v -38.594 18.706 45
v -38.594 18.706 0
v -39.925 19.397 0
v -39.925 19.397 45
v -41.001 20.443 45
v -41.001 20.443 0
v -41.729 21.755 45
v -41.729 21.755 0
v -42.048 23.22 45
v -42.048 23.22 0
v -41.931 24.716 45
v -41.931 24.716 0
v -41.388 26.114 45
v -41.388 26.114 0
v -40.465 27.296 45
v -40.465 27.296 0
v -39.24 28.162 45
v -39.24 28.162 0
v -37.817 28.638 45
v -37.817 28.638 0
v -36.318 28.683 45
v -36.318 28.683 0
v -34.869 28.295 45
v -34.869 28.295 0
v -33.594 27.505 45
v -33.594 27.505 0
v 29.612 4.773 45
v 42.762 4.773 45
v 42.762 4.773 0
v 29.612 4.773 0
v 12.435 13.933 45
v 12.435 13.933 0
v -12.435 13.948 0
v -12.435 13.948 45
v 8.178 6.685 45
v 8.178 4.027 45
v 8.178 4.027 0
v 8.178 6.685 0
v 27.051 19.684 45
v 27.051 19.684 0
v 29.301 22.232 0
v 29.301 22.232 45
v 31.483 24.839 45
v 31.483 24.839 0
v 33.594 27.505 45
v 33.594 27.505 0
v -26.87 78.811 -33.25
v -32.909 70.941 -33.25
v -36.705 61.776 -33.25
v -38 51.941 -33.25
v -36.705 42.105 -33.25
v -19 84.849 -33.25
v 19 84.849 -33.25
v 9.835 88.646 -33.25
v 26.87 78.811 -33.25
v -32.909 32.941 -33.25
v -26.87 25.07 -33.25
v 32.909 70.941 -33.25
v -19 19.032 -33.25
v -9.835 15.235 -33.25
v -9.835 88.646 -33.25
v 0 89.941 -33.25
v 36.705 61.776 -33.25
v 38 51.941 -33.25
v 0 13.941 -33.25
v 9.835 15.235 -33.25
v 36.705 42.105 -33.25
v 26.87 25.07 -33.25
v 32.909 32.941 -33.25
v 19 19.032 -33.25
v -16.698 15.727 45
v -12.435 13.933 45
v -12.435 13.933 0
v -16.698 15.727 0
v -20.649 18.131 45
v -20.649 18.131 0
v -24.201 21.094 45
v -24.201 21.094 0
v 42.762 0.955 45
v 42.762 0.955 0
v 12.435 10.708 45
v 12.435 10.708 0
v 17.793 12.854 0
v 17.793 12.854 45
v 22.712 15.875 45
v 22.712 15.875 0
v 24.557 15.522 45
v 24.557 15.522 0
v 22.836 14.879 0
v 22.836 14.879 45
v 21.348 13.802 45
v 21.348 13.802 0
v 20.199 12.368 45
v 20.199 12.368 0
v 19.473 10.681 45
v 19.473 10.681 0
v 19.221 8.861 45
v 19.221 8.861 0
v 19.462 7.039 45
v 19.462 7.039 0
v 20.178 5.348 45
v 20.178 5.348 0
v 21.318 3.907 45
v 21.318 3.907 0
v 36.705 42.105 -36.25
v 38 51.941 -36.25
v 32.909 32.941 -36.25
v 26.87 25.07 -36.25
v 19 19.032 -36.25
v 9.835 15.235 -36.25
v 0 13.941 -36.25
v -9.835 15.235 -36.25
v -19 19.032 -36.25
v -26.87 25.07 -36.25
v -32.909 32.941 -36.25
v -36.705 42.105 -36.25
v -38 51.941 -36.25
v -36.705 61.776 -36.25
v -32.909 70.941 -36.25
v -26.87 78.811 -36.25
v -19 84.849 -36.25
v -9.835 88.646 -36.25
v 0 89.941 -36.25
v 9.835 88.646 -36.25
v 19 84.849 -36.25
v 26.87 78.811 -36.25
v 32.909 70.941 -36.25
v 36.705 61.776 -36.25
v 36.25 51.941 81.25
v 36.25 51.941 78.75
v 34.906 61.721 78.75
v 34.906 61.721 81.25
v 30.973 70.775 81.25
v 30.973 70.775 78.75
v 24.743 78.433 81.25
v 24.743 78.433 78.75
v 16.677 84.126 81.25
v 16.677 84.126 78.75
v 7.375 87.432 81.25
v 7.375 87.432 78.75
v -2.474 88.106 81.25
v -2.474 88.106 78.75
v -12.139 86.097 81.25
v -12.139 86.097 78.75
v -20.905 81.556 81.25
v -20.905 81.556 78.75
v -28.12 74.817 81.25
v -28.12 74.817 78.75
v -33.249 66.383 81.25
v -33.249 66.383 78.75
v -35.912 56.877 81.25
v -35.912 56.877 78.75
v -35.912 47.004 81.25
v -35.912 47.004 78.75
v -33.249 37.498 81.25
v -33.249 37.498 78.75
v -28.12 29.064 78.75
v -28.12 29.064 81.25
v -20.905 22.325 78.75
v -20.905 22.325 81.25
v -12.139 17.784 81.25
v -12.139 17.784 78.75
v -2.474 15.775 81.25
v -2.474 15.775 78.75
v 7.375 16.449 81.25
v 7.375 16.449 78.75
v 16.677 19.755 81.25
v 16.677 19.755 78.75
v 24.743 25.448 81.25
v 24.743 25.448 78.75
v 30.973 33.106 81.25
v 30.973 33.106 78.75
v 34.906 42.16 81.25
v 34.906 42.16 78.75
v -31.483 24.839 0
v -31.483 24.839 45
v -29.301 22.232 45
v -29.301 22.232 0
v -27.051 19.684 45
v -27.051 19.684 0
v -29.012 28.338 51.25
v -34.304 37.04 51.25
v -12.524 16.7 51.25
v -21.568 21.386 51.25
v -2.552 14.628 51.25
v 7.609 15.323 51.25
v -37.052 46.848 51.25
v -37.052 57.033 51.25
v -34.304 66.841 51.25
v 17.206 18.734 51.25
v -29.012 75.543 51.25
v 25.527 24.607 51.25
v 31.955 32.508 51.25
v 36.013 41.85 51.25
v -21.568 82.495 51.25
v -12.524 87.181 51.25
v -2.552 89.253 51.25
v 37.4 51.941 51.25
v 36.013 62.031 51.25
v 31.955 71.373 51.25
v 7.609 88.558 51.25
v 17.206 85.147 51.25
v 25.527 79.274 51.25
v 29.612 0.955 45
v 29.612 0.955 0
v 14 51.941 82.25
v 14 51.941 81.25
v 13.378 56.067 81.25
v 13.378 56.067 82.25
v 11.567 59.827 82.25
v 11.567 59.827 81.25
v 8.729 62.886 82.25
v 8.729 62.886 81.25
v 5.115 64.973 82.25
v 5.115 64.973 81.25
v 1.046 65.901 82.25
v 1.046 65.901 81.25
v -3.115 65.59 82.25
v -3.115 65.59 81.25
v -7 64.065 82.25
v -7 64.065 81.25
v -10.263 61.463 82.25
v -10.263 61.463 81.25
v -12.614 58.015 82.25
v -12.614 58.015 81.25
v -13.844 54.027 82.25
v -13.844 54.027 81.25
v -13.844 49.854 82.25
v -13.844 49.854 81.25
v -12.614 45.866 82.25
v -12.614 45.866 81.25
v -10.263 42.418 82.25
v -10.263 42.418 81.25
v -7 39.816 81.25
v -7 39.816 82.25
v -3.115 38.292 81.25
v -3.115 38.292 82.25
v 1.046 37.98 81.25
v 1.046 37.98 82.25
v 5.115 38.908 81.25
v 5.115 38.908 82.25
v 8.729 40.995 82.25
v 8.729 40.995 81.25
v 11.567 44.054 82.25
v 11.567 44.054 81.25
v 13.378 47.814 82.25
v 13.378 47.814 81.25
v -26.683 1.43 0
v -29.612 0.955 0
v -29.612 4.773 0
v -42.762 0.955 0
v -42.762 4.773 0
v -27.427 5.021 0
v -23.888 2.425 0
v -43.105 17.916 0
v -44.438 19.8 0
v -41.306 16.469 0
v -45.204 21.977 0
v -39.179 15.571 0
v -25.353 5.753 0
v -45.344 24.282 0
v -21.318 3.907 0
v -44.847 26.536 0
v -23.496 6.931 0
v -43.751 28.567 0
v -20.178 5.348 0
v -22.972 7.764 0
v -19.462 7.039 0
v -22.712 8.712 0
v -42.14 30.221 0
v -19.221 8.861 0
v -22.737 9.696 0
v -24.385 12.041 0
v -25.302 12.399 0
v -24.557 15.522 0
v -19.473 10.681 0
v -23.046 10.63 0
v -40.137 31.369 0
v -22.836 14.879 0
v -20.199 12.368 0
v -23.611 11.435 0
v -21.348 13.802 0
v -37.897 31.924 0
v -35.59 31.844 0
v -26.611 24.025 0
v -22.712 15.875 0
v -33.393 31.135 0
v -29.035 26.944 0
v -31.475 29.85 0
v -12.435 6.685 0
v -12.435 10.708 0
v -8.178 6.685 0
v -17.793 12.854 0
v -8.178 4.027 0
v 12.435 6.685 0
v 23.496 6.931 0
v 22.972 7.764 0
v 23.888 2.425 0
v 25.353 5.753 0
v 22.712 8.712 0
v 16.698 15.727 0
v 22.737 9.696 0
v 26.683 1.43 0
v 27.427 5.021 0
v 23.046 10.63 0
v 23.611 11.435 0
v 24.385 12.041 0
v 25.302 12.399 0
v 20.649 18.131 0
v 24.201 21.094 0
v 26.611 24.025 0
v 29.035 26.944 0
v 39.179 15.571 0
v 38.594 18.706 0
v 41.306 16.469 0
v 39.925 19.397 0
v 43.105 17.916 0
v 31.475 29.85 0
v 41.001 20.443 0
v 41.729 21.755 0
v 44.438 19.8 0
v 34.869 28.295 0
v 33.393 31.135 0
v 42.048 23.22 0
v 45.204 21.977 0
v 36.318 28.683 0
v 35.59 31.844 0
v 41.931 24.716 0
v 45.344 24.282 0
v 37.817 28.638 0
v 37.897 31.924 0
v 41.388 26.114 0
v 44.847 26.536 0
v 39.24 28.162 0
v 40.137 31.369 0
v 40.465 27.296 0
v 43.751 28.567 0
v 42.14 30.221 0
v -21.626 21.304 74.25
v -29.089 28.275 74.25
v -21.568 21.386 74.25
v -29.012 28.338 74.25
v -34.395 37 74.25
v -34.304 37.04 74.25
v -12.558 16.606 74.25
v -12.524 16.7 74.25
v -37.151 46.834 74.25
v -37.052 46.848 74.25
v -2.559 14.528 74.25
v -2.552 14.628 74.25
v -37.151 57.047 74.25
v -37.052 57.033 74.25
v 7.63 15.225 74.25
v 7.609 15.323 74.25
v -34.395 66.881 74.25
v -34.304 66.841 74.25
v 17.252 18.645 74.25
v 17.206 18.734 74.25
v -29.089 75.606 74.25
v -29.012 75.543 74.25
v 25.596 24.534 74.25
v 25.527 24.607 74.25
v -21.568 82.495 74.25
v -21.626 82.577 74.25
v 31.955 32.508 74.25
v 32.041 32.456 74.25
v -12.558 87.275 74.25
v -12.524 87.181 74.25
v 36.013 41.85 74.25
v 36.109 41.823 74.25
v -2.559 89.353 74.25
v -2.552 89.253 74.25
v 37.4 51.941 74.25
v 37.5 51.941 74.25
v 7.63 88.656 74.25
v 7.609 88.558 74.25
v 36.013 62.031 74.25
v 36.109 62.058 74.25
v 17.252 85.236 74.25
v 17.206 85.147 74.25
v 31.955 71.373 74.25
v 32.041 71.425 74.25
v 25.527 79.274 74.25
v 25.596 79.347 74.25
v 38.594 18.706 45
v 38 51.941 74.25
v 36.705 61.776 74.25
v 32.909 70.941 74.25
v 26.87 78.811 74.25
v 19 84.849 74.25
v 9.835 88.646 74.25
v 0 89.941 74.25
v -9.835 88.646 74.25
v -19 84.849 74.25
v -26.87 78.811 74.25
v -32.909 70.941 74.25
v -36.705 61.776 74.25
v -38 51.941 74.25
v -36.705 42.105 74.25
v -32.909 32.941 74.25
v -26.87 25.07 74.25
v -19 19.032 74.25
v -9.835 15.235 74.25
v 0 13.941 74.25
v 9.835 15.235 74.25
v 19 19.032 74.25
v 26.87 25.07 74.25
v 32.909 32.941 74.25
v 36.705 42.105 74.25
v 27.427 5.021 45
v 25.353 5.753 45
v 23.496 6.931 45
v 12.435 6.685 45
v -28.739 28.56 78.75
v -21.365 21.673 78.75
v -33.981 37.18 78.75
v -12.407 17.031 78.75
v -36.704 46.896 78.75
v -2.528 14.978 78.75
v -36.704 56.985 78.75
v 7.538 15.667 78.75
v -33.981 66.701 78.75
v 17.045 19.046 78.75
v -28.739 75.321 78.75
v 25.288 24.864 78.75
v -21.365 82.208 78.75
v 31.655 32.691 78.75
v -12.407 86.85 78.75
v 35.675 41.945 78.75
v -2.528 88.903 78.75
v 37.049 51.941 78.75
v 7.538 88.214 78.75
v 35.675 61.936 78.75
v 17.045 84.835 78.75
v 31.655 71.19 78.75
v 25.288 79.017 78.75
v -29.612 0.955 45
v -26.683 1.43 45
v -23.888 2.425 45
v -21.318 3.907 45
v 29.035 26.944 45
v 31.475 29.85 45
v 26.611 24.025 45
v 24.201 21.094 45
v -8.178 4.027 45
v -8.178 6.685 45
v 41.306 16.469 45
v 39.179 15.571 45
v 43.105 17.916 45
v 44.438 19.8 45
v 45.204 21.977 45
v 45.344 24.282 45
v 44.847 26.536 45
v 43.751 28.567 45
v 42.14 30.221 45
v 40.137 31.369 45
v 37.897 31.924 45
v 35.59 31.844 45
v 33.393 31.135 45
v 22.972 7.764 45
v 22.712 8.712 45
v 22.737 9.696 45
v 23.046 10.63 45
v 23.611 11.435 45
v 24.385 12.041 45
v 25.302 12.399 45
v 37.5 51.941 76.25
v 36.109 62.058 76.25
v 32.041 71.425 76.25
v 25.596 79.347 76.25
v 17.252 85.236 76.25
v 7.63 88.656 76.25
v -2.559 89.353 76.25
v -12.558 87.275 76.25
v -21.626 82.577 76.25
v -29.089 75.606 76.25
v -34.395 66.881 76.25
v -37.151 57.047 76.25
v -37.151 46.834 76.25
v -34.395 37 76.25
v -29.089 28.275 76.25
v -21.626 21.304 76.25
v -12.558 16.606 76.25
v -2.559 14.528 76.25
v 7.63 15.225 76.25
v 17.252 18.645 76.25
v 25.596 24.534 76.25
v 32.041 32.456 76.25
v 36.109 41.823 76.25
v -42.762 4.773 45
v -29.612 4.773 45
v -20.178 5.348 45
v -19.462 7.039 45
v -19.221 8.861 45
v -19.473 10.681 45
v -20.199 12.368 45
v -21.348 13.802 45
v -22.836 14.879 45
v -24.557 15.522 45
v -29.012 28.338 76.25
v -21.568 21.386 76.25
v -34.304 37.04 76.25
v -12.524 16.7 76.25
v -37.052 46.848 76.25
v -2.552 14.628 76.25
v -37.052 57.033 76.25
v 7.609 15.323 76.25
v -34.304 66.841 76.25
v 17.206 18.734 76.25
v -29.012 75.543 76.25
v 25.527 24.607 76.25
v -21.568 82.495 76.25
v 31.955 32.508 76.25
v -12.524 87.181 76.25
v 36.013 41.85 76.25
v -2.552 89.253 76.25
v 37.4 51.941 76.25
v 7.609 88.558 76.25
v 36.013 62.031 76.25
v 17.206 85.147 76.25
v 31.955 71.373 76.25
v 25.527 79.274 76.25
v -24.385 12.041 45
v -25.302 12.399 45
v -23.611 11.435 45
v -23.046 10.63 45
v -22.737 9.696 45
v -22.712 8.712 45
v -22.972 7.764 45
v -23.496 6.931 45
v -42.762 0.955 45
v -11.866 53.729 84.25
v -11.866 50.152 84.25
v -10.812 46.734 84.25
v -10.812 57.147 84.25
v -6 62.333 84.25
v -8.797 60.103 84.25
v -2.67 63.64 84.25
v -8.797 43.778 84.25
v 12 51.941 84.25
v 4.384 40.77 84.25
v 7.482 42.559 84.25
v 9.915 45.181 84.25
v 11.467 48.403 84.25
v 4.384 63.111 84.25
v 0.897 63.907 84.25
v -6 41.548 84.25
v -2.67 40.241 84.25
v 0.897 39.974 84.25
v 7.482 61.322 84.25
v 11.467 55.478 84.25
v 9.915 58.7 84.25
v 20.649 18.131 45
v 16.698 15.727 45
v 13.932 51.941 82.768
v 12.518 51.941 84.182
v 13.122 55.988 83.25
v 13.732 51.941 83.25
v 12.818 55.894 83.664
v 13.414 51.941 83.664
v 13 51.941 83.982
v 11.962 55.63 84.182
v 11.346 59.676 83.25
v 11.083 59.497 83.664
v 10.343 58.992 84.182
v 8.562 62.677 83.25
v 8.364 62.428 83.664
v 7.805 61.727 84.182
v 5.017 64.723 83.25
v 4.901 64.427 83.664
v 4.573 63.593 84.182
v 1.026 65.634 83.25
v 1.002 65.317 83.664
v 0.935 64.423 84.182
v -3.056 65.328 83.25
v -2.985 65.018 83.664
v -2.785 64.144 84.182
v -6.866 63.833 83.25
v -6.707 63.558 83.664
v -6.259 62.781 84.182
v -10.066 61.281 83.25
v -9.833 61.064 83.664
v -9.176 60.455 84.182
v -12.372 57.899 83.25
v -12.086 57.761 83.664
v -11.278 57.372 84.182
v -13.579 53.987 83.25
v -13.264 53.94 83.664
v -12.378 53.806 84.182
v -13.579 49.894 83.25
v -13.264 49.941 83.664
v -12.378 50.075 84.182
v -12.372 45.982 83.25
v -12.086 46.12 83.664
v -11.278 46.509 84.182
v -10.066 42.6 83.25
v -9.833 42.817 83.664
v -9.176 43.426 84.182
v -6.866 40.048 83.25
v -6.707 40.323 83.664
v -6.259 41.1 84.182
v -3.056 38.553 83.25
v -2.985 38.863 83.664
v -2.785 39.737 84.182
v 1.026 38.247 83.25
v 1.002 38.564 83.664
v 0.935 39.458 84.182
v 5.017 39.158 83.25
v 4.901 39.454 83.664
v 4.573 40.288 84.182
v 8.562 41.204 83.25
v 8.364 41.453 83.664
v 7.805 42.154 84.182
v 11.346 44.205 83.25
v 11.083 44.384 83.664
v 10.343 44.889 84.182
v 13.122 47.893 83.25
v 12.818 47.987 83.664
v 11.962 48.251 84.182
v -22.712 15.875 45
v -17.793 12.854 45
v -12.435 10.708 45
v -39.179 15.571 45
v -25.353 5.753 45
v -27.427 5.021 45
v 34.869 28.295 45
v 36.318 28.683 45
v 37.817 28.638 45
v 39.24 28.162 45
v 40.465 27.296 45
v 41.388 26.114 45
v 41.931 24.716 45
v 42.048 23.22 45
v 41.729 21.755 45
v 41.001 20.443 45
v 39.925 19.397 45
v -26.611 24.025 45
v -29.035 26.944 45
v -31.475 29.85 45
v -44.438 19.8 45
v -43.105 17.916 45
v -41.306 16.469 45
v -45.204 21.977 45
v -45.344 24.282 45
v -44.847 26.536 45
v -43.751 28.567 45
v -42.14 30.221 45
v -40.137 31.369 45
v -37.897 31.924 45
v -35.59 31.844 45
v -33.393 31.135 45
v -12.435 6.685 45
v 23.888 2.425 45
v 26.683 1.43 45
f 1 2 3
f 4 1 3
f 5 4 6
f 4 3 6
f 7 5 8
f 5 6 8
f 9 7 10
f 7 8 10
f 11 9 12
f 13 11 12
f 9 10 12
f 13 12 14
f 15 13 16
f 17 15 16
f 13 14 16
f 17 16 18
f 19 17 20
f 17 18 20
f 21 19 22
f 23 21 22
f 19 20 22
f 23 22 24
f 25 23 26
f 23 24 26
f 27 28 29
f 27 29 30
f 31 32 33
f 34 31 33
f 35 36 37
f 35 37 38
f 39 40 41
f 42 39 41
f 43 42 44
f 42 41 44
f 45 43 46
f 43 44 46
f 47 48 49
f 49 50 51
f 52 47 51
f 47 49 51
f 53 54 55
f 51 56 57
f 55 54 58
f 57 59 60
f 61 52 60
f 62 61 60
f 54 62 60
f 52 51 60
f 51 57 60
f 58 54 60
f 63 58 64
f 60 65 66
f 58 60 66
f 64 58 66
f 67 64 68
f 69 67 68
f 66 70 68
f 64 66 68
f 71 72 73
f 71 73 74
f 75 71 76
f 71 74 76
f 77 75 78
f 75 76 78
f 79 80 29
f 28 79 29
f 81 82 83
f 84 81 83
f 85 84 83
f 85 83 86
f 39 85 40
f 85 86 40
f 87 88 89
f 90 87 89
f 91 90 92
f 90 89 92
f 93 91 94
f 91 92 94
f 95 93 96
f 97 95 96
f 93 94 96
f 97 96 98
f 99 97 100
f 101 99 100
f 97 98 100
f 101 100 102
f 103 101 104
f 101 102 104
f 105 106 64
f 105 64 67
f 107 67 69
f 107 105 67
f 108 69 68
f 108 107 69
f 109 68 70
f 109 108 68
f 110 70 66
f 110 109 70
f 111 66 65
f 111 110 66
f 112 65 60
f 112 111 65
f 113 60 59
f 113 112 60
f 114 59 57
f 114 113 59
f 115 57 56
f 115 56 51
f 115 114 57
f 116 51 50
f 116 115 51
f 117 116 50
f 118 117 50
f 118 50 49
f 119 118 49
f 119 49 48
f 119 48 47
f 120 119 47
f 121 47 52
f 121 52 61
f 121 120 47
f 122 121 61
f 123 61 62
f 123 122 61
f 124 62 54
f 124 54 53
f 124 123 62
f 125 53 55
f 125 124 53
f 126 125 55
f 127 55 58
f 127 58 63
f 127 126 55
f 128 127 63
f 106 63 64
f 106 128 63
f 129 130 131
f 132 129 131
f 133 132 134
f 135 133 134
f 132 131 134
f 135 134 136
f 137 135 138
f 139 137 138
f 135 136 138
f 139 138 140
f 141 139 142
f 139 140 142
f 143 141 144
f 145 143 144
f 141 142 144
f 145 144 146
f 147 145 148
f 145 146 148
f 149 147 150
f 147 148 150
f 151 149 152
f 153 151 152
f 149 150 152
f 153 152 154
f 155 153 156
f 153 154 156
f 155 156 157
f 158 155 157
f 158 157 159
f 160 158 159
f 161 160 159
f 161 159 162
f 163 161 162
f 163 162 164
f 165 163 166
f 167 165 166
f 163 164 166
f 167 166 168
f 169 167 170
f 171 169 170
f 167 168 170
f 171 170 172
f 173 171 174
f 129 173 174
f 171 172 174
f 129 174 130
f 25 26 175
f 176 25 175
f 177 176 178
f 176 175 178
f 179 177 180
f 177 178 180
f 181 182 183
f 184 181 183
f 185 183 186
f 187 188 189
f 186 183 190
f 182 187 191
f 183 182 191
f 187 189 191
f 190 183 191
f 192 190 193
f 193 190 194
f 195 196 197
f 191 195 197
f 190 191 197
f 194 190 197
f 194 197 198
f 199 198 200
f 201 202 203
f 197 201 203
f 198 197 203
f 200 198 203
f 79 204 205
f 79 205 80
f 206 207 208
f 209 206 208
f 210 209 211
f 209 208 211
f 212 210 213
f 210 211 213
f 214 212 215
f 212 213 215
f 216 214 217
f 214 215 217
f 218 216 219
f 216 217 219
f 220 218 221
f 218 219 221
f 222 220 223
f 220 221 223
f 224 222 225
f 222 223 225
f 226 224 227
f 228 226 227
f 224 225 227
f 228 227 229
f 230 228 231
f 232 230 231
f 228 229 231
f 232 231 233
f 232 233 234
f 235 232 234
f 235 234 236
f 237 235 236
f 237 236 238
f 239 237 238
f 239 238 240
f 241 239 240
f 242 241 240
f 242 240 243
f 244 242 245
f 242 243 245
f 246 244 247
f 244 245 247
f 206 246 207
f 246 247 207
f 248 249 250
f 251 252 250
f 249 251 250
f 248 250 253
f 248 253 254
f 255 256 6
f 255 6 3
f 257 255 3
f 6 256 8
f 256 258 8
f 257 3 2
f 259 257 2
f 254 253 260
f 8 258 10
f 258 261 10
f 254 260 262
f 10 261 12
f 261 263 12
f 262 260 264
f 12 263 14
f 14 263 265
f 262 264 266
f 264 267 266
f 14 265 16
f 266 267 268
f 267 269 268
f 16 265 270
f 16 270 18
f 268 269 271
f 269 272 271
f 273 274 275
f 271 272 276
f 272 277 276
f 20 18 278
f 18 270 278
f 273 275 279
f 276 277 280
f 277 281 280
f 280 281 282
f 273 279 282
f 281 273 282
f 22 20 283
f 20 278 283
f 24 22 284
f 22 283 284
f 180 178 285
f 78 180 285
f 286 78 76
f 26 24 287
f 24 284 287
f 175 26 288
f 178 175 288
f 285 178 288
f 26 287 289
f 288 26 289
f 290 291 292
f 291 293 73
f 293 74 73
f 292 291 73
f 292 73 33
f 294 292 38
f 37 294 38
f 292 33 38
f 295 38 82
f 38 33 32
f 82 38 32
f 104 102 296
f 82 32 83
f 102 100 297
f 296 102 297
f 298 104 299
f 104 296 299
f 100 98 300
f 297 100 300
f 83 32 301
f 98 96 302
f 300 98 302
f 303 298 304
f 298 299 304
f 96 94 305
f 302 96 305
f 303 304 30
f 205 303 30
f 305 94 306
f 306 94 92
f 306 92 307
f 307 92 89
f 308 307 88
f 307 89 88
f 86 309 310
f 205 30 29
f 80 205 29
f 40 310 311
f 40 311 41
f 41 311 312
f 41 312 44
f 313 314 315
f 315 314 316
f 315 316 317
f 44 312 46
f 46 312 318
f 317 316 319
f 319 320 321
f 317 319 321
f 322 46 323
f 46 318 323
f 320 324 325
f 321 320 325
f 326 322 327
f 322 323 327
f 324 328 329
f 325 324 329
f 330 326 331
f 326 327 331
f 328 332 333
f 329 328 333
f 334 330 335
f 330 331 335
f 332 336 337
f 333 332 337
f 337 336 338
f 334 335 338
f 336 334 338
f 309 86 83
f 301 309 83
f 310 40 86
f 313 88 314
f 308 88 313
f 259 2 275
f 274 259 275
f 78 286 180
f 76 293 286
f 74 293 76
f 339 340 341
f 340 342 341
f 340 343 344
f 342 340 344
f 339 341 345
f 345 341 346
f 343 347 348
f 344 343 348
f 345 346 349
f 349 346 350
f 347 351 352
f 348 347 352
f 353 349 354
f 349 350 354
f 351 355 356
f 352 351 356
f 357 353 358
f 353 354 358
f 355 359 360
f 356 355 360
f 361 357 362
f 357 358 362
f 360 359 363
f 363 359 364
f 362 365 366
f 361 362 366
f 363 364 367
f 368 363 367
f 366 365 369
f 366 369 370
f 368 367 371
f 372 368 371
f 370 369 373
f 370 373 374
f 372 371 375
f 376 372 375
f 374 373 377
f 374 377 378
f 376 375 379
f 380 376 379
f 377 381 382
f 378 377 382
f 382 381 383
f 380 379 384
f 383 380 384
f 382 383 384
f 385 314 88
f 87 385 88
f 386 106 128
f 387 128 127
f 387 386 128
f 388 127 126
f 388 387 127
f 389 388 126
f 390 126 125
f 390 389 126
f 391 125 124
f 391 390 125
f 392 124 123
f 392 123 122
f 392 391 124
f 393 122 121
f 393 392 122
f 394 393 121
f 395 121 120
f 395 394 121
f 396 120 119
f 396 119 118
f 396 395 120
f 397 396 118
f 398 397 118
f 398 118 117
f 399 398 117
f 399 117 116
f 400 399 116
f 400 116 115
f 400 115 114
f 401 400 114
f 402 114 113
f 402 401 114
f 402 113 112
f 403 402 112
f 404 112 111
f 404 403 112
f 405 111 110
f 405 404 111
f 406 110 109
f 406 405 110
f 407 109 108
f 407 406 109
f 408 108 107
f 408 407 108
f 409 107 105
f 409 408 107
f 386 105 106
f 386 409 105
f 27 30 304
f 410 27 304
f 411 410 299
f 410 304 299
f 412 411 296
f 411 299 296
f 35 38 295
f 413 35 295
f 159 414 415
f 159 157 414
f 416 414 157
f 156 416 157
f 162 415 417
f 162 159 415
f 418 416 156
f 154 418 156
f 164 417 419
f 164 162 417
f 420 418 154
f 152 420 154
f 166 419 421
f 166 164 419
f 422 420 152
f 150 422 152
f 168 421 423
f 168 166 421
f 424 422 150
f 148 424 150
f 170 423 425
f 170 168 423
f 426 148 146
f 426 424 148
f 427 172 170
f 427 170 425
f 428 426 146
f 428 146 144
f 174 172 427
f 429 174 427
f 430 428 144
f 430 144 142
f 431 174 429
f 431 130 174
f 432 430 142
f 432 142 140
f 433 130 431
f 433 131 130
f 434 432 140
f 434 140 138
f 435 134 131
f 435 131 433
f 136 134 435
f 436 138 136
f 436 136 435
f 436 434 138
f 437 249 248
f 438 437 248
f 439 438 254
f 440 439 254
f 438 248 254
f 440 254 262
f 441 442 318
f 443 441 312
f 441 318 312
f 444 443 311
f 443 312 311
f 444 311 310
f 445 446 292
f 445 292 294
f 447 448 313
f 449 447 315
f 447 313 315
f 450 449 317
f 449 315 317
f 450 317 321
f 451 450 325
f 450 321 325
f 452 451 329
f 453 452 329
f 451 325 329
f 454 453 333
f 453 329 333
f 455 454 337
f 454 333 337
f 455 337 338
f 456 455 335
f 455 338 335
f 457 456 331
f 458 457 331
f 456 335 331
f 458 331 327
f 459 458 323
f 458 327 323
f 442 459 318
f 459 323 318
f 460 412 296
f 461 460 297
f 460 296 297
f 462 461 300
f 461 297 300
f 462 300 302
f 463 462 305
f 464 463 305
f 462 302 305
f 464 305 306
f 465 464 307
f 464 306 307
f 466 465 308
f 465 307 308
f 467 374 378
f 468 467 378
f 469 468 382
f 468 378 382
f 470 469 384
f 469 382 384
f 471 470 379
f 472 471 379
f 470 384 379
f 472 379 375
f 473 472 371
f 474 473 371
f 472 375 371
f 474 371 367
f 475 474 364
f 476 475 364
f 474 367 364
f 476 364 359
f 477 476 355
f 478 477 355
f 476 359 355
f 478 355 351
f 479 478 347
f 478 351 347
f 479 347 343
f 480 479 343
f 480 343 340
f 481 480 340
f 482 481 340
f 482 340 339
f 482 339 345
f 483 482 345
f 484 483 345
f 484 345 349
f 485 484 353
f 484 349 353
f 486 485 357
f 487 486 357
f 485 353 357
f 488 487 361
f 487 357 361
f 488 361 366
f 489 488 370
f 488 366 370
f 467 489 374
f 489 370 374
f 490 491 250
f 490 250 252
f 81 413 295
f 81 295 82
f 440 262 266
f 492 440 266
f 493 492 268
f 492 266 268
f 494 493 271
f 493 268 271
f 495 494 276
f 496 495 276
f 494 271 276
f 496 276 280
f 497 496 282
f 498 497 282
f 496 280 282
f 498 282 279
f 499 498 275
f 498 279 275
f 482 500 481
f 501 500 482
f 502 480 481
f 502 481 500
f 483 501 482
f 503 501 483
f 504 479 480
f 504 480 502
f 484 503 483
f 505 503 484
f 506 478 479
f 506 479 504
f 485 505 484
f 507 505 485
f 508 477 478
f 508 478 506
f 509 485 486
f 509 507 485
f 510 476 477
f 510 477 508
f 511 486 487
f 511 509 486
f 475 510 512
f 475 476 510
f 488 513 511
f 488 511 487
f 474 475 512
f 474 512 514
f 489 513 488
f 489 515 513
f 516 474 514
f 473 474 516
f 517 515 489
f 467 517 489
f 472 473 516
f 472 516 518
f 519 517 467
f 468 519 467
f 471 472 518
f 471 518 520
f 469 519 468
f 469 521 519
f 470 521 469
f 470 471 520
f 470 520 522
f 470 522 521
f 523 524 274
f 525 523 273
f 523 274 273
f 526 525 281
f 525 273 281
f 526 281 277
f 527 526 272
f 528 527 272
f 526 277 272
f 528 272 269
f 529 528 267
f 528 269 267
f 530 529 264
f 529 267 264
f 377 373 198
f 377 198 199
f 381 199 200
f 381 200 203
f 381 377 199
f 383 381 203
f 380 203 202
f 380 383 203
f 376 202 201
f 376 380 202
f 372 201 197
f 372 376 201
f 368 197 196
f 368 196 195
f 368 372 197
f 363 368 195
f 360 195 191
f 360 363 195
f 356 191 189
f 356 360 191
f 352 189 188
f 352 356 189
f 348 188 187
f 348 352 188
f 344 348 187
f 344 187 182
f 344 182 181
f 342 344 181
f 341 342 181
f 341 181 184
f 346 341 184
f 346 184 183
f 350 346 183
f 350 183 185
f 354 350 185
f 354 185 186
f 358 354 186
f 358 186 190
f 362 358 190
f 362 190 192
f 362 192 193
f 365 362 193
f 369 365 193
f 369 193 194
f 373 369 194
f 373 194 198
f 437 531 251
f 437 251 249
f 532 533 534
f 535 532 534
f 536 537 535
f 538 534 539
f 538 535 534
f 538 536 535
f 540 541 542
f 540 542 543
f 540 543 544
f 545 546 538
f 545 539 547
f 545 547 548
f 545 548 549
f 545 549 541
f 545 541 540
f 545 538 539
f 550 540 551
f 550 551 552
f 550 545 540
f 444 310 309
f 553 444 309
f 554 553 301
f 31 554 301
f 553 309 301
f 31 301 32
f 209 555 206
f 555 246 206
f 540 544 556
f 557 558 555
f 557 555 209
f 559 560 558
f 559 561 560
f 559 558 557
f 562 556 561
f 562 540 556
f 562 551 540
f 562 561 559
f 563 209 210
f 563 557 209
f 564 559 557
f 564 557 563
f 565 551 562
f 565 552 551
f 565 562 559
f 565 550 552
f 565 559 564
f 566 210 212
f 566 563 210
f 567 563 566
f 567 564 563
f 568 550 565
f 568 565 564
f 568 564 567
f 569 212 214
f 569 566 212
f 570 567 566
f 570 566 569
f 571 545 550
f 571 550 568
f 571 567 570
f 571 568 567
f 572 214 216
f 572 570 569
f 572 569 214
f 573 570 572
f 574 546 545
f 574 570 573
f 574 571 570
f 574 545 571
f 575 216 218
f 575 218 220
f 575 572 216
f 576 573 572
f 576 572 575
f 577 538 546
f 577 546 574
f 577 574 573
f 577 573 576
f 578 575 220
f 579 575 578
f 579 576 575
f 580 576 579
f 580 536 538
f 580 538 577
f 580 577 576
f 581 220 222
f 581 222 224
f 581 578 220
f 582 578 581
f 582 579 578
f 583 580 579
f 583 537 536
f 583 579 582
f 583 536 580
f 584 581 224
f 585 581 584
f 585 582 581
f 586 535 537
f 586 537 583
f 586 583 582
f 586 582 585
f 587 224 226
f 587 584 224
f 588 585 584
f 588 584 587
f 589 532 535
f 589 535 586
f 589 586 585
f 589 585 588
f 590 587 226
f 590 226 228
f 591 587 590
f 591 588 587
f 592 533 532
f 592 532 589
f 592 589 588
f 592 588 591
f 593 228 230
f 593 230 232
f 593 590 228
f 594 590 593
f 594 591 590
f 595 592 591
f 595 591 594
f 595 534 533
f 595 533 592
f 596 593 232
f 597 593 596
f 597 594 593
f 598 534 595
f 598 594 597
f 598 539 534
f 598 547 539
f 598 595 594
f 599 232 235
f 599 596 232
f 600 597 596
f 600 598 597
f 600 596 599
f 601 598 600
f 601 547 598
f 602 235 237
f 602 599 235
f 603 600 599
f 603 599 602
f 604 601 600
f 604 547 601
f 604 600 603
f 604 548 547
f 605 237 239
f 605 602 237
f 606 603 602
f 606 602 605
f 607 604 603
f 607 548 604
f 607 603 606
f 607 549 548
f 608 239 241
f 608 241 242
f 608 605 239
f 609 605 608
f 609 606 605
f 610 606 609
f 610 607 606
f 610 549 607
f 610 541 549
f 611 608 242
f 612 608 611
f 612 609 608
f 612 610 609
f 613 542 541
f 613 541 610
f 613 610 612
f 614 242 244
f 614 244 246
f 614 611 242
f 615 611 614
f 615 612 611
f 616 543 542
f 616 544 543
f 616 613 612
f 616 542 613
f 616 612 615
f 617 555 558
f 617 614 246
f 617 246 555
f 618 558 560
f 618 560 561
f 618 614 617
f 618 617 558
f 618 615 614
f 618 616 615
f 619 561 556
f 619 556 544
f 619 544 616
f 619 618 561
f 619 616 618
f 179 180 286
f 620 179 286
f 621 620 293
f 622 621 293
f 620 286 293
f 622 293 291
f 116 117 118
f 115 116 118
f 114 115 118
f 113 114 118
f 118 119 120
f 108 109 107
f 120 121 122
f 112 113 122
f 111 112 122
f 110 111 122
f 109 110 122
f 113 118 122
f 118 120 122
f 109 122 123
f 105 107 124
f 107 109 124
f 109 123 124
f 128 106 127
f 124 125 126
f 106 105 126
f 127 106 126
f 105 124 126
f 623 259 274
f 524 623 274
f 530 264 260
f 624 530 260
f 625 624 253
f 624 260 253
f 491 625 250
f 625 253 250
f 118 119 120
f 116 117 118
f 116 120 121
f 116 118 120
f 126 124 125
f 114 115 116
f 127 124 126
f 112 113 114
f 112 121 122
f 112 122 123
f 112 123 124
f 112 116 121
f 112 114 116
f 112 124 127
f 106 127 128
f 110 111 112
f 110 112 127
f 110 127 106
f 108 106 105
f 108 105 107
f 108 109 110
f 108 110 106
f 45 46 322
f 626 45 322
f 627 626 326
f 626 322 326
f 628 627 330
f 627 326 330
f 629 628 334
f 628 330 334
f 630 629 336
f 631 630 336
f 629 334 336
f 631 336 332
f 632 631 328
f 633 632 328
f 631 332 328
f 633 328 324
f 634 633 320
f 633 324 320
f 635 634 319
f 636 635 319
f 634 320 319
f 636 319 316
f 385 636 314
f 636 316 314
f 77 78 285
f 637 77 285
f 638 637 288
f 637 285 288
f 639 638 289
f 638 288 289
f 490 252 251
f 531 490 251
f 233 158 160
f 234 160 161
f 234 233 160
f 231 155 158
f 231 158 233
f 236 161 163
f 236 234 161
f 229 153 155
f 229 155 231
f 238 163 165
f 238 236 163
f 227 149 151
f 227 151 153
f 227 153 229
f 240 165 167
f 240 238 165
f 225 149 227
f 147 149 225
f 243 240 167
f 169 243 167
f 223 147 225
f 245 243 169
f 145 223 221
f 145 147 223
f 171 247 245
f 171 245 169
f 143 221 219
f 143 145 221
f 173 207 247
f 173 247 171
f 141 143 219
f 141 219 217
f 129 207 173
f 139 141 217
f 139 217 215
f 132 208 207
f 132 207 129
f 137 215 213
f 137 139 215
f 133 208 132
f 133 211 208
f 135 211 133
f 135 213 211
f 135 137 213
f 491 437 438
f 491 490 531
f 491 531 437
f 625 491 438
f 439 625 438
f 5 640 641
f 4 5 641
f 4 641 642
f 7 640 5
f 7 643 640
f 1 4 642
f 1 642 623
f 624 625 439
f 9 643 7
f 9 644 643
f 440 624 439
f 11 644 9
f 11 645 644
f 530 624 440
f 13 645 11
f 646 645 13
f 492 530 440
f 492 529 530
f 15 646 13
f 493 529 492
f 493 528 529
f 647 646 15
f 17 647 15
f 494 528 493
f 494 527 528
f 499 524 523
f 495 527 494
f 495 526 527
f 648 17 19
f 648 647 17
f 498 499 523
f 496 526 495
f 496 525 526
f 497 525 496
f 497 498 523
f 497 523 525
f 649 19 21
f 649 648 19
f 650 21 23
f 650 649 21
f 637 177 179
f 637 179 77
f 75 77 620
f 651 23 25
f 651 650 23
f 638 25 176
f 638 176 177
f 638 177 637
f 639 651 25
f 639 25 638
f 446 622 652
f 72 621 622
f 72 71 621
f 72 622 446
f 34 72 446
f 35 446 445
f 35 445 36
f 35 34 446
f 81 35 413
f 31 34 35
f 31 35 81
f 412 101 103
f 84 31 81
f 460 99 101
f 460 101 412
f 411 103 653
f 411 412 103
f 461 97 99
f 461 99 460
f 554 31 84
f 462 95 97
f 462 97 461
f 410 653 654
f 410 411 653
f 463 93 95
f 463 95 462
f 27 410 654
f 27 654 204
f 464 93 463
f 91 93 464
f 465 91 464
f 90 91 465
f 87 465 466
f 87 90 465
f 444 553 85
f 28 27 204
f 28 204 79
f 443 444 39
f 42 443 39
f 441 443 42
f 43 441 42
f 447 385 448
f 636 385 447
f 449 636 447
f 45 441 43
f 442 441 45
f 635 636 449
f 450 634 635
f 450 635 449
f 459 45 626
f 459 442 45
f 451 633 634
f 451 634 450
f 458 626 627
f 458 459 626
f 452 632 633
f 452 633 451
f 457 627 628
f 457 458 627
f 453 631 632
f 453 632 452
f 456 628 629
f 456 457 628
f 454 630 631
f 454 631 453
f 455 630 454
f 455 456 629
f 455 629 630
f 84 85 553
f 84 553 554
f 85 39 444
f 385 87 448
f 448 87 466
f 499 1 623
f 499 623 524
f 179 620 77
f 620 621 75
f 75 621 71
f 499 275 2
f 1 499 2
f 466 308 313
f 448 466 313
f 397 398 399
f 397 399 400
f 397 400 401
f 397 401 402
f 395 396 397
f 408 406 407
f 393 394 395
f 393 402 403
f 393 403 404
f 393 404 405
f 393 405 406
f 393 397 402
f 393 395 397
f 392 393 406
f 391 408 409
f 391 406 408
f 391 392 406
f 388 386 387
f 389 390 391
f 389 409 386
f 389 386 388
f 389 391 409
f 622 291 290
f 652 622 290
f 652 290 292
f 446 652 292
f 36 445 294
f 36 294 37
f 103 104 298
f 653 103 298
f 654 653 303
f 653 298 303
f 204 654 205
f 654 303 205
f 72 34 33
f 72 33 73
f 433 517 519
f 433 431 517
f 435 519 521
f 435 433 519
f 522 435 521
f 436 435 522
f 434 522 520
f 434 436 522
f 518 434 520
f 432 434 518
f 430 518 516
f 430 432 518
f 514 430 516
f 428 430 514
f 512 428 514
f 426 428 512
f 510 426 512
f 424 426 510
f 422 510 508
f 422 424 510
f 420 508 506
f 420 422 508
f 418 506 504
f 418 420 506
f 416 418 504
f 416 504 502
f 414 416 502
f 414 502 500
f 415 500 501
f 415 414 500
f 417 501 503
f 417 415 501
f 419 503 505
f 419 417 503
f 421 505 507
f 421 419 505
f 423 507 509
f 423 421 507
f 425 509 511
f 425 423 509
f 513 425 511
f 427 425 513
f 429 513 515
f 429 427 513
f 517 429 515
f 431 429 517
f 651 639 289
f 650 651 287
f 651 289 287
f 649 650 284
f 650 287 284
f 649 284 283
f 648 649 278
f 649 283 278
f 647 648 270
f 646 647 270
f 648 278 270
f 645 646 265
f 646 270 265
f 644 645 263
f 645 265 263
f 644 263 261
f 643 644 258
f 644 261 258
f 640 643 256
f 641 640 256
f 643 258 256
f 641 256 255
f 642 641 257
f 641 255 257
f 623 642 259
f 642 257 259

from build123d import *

# Parameters (mm, degrees)
F2_DEPTH       = 45
F4_R           = 38
F5_DEPTH       = 55.25
F7_DEPTH       = 45
F8_R           = 37.5
F9_DEPTH       = 2
F10_R          = 37.4
F11_DEPTH      = 2.5
F11_TAPER      = 8
F11_DEPTH_BACK = 25
F12_R          = 36.25
F13_DEPTH      = 2.5
F14_R          = 14
F5_FACE1_R     = 38
F15_DEPTH      = 3
F16_R          = 2


with BuildPart() as f2:
    # F1 (on Top) → F2 (new body)
    with BuildSketch(Plane.XY):
        with BuildLine():
            Line((-42.7623353899, 4.772992339), (-42.7623353899, 0.9551661788))
            Line((-42.7623353899, 0.9551661788), (-29.6120457351, 0.9551661788))
            ThreePointArc((-29.6120457351, 0.9551661788), (-25.2633665331, 1.8643256085), (-21.3180668652, 3.9069200866))
            ThreePointArc((-21.3180668652, 3.9069200866), (-19.4726981458, 10.6806652344), (-24.5569021704, 15.5221400588))
            Line((-24.5569021704, 15.5221400588), (-38.5941788554, 18.7059398741))
            ThreePointArc((-38.5941788554, 18.7059398741), (-41.3879536384, 26.1139438263), (-33.5937328637, 27.5045633316))
            ThreePointArc((-33.5937328637, 27.5045633316), (-30.4010264003, 23.5282383436), (-27.0505733788, 19.6838919073))
            ThreePointArc((-27.0505733788, 19.6838919073), (-14.6826563319, 11.4803283735), (0, 9.3162050471))
            ThreePointArc((0, 9.3162050471), (14.6826563319, 11.4803283735), (27.0505733788, 19.6838919073))
            ThreePointArc((27.0505733788, 19.6838919073), (30.4010264003, 23.5282383436), (33.5937328637, 27.5045633316))
            ThreePointArc((33.5937328637, 27.5045633316), (41.3879536384, 26.1139438263), (38.5941788554, 18.7059398741))
            Line((38.5941788554, 18.7059398741), (24.5569021704, 15.5221400588))
            ThreePointArc((24.5569021704, 15.5221400588), (19.4726981458, 10.6806652344), (21.3180668652, 3.9069200866))
            ThreePointArc((21.3180668652, 3.9069200866), (25.2633665331, 1.8643256085), (29.6120457351, 0.9551661788))
            Line((29.6120457351, 0.9551661788), (42.7623353899, 0.9551661788))
            Line((42.7623353899, 0.9551661788), (42.7623353899, 4.772992339))
            Line((42.7623353899, 4.772992339), (29.6120457351, 4.772992339))
            ThreePointArc((29.6120457351, 4.772992339), (26.3691321778, 5.3282354057), (23.4956573695, 6.9307102822))
            ThreePointArc((23.4956573695, 6.9307102822), (22.8570637764, 10.1739231369), (25.3019461508, 12.3985088452))
            Line((25.3019461508, 12.3985088452), (39.1790941358, 15.57139121))
            ThreePointArc((39.1790941358, 15.57139121), (44.369461521, 27.5896469324), (31.4749777317, 29.8503264785))
            ThreePointArc((31.4749777317, 29.8503264785), (27.8210747764, 25.4860510297), (24.2009833455, 21.0936889052))
            ThreePointArc((24.2009833455, 21.0936889052), (13.0370554513, 14.1423064512), (0, 12.4130900949))
            ThreePointArc((0, 12.4130900949), (-13.0370554513, 14.1423064512), (-24.2009833455, 21.0936889052))
            ThreePointArc((-24.2009833455, 21.0936889052), (-27.8210747764, 25.4860510297), (-31.4749777317, 29.8503264785))
            ThreePointArc((-31.4749777317, 29.8503264785), (-44.369461521, 27.5896469324), (-39.1790941358, 15.57139121))
            Line((-39.1790941358, 15.57139121), (-25.3019461508, 12.3985088452))
            ThreePointArc((-25.3019461508, 12.3985088452), (-22.8570637764, 10.1739231369), (-23.4956573695, 6.9307102822))
            ThreePointArc((-23.4956573695, 6.9307102822), (-26.3691321778, 5.3282354057), (-29.6120457351, 4.772992339))
            Line((-29.6120457351, 4.772992339), (-42.7623353899, 4.772992339))
        make_face()
    extrude(amount=F2_DEPTH)

    # F6 (on face) → F7 (join)
    with BuildSketch(Plane.XY.offset(45)):
        Polygon((12.4345744927, 6.6851694137), (12.4345744927, 13.9331343145), (-12.4345744927, 13.9478761571), (-12.4345744927, 6.6851694137), (-8.1776473671, 6.6851694137), (-8.1776473671, 4.027030806), (8.1776473671, 4.027030806), (8.1776473671, 6.6851694137), align=None)
    extrude(amount=-F7_DEPTH)


with BuildPart() as f5:
    # F4 (on offset) → F5 (new body, symmetric)
    with BuildSketch(Plane.XY.offset(19)):
        with Locations((0, 51.9405119121)):
            Circle(F4_R)
    extrude(amount=F5_DEPTH, both=True)


with BuildPart() as f9:
    # F8 (on face) → F9 (new body)
    with BuildSketch(Plane.XY.offset(74.25)):
        with Locations((0, 51.9405119121)):
            Circle(F8_R)
    extrude(amount=F9_DEPTH)

    # F10 (on face) → F11 (join, two sides)
    with BuildSketch(Plane.XY.offset(76.25)) as f11_sk:
        with Locations((0, 51.9405119121)):
            Circle(F10_R)
    extrude(amount=F11_DEPTH, taper=F11_TAPER)
    extrude(f11_sk.sketch, amount=-F11_DEPTH_BACK)

    # F12 (on face) → F13 (join)
    with BuildSketch(Plane.XY.offset(78.75)):
        with Locations((0, 51.9405119121)):
            Circle(F12_R)
    extrude(amount=F13_DEPTH)

    # F14 (on face) + F5_face1 (on face) → F15 (join)
    with BuildSketch(Plane.XY.offset(81.25)):
        with Locations((0, 51.9405119121)):
            Circle(F14_R)
    with BuildSketch(Plane(origin=(0, 51.9405119121, -36.25), x_dir=(1, 0, 0), z_dir=(0, 0, -1))):
        Circle(F5_FACE1_R)
    extrude(amount=F15_DEPTH, dir=(0, 0, 1))

    # F16
    f16_edges = [f9.edges().sort_by_distance(p)[0] for p in [
        (-14, 51.940512, 84.25),
    ]]
    fillet(f16_edges, radius=F16_R)


solid = Compound([f2.part, f5.part, f9.part])
